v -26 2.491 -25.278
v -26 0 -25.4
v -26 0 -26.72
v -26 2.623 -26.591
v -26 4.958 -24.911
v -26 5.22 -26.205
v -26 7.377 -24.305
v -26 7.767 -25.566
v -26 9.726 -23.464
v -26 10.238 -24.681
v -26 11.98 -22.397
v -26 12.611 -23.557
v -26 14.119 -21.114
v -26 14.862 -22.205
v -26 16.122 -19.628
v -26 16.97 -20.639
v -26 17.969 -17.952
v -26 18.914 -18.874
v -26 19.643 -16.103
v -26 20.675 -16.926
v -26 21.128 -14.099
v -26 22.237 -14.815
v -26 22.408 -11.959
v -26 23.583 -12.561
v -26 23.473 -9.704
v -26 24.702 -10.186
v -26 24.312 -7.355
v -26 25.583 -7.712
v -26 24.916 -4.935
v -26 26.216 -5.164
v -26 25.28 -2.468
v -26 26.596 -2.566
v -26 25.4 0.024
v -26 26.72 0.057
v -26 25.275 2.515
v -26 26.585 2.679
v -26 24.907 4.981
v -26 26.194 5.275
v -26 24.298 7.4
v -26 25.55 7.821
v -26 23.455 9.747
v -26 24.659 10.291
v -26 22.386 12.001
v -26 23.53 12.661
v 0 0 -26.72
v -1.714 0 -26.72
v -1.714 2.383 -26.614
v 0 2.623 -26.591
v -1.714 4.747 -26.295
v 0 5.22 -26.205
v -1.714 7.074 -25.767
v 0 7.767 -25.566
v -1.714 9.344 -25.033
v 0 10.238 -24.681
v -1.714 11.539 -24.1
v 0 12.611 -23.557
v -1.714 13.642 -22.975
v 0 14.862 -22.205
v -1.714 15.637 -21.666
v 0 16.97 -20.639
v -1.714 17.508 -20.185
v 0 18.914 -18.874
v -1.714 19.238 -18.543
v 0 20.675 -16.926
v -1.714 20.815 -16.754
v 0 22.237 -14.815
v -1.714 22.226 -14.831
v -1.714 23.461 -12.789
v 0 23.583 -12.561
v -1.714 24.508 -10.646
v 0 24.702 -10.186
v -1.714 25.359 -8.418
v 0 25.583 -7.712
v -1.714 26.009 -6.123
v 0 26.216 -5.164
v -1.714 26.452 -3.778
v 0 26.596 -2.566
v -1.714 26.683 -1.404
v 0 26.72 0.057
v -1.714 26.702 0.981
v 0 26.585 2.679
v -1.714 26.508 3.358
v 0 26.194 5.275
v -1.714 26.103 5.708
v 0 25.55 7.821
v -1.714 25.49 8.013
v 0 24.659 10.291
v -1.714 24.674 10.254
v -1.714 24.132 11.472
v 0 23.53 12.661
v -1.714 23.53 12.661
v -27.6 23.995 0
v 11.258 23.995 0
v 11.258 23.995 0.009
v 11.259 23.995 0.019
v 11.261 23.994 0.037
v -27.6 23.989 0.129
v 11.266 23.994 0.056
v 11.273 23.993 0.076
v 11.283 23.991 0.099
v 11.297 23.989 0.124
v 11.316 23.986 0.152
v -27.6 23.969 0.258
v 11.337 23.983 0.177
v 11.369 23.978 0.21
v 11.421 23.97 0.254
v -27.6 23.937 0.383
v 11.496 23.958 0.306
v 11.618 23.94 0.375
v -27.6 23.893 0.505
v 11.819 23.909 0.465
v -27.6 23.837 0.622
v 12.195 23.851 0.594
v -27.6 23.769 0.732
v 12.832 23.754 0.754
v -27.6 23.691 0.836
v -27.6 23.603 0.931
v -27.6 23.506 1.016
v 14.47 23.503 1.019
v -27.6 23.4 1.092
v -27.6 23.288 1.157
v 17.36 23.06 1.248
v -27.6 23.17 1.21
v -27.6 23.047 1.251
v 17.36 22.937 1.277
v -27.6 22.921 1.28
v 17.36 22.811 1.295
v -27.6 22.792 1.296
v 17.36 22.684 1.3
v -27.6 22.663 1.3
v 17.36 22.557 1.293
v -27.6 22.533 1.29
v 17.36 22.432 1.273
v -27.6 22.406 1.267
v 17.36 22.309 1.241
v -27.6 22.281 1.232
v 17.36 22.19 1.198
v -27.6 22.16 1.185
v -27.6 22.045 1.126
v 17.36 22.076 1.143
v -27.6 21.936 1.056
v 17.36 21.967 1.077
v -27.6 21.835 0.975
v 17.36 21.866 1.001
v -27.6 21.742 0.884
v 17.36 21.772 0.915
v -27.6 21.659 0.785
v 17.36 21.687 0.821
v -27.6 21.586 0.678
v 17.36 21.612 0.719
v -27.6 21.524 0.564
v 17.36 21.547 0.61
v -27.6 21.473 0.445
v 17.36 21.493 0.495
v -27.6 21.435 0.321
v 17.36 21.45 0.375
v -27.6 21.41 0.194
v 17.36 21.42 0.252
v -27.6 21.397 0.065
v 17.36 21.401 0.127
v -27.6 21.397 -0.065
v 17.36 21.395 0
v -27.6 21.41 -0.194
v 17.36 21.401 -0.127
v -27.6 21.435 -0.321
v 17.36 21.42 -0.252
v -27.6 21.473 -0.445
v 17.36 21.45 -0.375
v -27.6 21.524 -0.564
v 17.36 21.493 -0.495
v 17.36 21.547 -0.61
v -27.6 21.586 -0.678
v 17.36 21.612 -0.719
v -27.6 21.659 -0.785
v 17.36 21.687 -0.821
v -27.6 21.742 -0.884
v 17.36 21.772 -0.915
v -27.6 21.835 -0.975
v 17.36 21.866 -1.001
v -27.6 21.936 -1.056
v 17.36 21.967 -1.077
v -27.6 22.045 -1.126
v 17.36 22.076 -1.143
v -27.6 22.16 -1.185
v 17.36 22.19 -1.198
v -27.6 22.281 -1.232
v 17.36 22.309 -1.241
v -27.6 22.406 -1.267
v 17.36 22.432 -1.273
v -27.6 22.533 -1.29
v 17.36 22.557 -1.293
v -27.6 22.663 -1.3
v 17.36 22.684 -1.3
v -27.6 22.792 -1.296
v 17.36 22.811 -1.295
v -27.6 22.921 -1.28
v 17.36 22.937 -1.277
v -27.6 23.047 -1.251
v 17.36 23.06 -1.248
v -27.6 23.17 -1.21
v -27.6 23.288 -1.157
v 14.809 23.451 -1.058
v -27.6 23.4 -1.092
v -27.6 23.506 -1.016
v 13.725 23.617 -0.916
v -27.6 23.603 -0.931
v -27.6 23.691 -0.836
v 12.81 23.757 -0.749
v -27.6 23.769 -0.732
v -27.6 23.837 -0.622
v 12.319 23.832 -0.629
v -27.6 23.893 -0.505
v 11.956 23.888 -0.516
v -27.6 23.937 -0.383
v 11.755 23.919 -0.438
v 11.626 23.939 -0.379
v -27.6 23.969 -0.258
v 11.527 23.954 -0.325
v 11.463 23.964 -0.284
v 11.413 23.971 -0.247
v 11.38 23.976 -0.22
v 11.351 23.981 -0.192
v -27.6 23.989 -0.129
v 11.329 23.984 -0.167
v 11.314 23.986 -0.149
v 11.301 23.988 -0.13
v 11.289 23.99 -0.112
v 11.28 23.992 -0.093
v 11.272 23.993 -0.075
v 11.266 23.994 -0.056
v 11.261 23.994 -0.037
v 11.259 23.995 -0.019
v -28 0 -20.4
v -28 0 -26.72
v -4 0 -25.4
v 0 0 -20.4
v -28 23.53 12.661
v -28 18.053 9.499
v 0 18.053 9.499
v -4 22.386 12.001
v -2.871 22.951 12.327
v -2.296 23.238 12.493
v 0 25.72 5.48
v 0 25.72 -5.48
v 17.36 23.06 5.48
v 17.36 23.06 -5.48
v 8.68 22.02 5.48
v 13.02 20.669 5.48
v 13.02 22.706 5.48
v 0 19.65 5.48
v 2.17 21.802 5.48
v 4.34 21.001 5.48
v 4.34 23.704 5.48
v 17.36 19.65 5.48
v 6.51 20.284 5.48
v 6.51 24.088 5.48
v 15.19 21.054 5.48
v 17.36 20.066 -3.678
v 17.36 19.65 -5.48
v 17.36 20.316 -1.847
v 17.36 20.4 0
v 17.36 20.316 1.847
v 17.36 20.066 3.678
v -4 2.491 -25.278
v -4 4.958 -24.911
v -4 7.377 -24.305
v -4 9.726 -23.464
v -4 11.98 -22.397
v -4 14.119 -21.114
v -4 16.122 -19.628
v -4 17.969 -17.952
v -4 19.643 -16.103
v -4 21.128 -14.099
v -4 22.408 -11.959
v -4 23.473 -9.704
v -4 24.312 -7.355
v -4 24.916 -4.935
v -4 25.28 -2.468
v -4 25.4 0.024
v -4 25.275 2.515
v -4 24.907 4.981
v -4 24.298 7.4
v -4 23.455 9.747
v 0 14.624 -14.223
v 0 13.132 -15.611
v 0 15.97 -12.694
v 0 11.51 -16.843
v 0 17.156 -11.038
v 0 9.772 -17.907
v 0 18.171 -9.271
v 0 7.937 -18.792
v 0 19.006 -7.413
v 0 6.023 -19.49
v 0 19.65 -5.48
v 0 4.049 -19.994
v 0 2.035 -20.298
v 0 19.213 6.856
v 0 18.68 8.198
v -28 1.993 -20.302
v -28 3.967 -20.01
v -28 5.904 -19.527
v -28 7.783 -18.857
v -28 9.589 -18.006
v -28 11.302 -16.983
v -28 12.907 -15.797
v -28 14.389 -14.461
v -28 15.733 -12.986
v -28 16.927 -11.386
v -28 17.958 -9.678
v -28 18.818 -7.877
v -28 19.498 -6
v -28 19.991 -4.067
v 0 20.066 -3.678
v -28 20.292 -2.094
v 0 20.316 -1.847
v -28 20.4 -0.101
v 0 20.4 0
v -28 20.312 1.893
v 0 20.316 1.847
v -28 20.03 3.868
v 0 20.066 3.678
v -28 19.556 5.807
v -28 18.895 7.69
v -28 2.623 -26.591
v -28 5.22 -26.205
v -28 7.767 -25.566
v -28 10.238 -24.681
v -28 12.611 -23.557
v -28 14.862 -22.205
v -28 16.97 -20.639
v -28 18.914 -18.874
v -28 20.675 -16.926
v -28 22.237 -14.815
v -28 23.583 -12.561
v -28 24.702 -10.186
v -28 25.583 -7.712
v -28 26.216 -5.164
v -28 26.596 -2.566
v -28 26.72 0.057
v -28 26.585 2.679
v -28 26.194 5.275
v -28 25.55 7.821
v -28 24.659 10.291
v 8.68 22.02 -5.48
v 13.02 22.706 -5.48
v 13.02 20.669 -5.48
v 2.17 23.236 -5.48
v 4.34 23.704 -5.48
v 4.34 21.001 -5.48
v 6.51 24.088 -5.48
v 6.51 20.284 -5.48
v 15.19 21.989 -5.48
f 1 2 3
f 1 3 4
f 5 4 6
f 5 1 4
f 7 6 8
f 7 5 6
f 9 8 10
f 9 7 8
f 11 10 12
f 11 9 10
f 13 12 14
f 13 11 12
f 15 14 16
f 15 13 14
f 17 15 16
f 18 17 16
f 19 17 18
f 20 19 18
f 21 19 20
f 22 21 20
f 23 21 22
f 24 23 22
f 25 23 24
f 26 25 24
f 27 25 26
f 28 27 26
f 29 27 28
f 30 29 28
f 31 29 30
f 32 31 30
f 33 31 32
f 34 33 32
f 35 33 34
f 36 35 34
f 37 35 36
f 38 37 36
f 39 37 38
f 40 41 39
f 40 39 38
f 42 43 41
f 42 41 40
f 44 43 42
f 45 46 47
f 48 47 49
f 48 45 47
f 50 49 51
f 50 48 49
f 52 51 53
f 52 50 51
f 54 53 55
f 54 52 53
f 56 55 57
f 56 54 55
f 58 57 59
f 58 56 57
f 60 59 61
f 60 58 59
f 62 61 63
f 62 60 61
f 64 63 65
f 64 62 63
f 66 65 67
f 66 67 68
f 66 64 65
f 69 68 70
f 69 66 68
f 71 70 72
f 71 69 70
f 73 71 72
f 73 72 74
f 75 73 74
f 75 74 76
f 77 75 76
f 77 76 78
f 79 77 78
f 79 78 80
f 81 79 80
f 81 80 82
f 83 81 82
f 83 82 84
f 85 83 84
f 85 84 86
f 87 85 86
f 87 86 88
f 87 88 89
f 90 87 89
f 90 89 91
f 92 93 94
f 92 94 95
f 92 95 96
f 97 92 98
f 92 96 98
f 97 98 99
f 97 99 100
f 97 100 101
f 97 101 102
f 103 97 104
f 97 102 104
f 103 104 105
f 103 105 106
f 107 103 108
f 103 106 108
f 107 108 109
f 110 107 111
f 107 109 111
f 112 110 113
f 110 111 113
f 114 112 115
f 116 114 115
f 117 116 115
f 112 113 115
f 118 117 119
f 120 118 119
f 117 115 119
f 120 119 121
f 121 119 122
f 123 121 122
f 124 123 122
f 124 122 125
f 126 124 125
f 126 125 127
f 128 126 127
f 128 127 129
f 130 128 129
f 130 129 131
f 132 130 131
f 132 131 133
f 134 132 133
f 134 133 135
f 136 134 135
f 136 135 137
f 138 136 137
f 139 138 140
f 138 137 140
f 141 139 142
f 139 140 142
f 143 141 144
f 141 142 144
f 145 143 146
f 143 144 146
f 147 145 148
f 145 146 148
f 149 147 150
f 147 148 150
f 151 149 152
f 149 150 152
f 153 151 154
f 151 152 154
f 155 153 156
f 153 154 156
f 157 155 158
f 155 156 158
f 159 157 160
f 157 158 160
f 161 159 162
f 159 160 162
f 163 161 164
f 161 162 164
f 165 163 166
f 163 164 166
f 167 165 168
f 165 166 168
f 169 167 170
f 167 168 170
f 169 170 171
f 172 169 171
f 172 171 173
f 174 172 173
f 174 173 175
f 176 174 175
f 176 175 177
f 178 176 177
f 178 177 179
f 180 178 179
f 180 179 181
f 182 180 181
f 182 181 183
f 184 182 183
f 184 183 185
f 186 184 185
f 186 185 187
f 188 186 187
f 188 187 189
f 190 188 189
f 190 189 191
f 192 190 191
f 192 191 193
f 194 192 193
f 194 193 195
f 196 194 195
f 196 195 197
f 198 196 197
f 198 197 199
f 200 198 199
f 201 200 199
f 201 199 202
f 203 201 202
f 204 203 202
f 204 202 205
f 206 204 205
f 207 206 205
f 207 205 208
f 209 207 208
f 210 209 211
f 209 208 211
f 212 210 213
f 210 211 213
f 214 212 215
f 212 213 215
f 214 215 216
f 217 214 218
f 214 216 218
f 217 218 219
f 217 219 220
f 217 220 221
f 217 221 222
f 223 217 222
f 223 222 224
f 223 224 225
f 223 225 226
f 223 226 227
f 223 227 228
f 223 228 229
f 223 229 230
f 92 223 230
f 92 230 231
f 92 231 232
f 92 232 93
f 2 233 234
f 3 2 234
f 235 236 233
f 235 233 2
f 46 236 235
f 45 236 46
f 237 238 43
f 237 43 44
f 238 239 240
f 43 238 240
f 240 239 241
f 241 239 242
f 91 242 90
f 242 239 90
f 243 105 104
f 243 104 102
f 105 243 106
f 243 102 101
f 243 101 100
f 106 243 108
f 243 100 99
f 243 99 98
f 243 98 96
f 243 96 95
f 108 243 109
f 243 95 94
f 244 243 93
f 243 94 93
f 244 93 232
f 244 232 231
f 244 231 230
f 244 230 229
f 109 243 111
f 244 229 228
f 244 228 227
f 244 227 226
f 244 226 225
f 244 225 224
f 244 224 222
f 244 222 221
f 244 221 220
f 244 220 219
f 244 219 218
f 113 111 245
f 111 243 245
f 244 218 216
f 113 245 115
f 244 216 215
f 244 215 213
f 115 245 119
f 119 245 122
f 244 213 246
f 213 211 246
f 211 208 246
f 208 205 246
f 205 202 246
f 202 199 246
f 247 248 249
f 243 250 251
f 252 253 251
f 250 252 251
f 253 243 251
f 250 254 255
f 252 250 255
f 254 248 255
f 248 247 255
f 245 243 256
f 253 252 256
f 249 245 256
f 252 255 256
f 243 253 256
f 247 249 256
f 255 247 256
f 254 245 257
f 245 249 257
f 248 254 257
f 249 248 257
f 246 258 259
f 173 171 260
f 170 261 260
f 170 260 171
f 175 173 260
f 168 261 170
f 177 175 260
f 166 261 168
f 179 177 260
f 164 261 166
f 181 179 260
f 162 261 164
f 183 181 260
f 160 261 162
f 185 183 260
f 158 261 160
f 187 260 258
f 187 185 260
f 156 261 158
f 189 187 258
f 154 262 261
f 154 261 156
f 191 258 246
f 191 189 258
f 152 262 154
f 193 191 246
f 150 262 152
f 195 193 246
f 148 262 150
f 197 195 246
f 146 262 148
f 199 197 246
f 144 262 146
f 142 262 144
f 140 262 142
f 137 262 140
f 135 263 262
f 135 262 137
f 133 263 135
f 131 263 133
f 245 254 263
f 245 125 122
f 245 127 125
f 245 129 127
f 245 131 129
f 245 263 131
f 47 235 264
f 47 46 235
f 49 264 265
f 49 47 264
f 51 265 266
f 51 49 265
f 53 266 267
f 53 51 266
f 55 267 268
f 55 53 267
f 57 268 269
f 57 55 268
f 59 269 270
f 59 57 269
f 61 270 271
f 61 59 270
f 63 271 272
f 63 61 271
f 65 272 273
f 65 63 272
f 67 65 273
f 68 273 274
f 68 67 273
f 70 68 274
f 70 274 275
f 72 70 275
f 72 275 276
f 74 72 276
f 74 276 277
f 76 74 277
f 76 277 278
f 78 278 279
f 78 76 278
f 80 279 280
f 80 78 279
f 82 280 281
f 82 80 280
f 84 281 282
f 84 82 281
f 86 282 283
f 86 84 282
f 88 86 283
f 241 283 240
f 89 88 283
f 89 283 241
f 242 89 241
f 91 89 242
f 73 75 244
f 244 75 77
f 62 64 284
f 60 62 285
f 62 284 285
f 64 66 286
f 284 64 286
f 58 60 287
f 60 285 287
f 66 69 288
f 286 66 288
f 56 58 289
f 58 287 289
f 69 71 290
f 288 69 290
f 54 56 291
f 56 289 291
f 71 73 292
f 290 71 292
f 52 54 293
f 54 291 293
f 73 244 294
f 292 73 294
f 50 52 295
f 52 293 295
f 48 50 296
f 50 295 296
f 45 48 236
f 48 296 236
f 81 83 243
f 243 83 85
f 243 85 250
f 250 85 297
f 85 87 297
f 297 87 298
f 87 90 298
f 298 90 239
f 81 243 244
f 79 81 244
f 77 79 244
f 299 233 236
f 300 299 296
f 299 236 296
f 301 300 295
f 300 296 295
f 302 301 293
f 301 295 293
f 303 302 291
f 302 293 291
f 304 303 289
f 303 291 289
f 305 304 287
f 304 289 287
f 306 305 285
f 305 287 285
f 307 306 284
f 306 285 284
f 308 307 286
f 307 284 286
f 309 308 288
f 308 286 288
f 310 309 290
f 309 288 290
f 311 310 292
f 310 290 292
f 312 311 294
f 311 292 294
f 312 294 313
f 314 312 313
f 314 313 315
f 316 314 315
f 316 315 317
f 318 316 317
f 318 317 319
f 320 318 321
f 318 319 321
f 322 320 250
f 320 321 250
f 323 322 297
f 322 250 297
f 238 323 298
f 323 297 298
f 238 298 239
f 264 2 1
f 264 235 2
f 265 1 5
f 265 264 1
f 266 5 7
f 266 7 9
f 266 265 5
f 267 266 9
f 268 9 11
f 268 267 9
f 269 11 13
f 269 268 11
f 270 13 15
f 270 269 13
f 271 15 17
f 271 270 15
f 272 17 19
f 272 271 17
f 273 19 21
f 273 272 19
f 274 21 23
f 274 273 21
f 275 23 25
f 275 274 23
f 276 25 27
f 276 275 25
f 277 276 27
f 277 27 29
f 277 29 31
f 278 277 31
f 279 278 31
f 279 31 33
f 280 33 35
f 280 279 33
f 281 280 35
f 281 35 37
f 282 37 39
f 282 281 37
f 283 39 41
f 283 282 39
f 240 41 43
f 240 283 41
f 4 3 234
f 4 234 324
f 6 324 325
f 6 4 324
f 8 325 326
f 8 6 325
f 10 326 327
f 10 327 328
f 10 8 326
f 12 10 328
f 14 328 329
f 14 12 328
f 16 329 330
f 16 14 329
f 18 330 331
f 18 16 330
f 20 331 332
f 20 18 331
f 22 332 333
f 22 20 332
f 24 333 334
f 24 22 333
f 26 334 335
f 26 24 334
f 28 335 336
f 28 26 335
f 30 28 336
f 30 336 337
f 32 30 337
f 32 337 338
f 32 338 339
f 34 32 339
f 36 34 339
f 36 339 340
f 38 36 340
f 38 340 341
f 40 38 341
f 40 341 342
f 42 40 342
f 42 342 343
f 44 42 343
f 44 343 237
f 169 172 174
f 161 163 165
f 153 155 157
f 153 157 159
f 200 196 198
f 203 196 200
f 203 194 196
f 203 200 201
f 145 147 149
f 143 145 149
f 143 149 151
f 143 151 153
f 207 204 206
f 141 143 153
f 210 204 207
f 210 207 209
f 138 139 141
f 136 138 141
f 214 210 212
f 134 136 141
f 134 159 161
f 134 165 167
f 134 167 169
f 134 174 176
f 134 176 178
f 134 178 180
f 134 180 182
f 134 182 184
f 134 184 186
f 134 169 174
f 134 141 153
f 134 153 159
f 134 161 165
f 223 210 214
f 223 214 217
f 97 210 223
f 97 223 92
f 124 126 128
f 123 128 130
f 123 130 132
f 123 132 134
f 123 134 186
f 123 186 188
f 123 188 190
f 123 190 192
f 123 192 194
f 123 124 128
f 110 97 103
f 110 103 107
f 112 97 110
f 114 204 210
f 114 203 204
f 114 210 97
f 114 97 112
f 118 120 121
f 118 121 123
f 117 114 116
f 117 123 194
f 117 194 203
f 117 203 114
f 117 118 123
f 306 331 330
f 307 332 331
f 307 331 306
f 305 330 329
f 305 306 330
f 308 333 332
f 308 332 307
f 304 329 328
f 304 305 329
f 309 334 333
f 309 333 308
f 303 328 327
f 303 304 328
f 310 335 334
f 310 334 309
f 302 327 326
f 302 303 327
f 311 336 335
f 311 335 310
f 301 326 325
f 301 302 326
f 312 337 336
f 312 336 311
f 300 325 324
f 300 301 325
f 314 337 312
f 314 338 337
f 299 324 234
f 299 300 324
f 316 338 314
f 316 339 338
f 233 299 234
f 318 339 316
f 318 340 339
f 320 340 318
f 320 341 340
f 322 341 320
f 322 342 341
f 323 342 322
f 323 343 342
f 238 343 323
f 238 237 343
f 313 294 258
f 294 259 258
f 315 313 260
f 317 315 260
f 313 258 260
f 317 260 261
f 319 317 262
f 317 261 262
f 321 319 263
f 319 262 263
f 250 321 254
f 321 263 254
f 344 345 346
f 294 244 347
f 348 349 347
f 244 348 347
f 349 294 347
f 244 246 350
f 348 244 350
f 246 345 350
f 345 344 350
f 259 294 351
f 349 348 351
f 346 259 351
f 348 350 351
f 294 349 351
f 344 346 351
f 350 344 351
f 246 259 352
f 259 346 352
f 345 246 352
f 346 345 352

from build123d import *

# Parameters (mm, degrees)
PAD017_DEPTH    = 28
SKETCH059_R     = 1.3
POCKET008_DEPTH = 48


with BuildPart() as part:
    # Sketch055 → Pad017 (new body)
    with BuildSketch(Plane.YZ):
        with BuildLine():
            ThreePointArc((0, -20.4), (17.463482, -10.544515), (18.053328, 9.499334))
            Line((18.053328, 9.499334), (23.529825, 12.66119))
            ThreePointArc((0, -26.72), (22.937583, -13.704952), (23.529825, 12.66119))
            Line((0, -20.4), (0, -26.72))
        make_face()
    extrude(amount=-PAD017_DEPTH)

    # Sketch056 → AdditiveLoft002 section 0
    with BuildSketch(Plane.YZ):
        with BuildLine():
            Line((19.650206, 5.479909), (25.72, 5.479909))
            Line((25.72, 5.479909), (25.72, -5.479909))
            Line((25.72, -5.479909), (19.650206, -5.479909))
            ThreePointArc((19.650206, -5.479909), (20.4, 0), (19.650206, 5.479909))
        make_face()
    # Sketch057 → AdditiveLoft002 section 1
    with BuildSketch(Plane.YZ.offset(17.36)):
        with BuildLine():
            Line((19.650206, 5.479909), (23.06, 5.479909))
            Line((23.06, 5.479909), (23.06, -5.479909))
            Line((23.06, -5.479909), (19.650206, -5.479909))
            ThreePointArc((19.650206, -5.479909), (20.4, 0), (19.650206, 5.479909))
        make_face()
    loft()

    # Sketch058 → Groove001 (revolve, cut)
    with BuildSketch(Plane.XY):
        Polygon((-28, 27.4), (-26, 27.4), (-26, 25.4), (-4, 25.4), (0, 27.709401), (0, 63.2), (-28, 63.2), align=None)
    revolve(axis=Axis((0, 0, 0), (1, 0, 0)), mode=Mode.SUBTRACT)

    # Sketch059 → Pocket008 (cut)
    with BuildSketch(Plane.YZ.offset(20.4)):
        with Locations((22.695, 0)):
            Circle(SKETCH059_R)
    extrude(amount=-POCKET008_DEPTH, mode=Mode.SUBTRACT)


solid = part.part
